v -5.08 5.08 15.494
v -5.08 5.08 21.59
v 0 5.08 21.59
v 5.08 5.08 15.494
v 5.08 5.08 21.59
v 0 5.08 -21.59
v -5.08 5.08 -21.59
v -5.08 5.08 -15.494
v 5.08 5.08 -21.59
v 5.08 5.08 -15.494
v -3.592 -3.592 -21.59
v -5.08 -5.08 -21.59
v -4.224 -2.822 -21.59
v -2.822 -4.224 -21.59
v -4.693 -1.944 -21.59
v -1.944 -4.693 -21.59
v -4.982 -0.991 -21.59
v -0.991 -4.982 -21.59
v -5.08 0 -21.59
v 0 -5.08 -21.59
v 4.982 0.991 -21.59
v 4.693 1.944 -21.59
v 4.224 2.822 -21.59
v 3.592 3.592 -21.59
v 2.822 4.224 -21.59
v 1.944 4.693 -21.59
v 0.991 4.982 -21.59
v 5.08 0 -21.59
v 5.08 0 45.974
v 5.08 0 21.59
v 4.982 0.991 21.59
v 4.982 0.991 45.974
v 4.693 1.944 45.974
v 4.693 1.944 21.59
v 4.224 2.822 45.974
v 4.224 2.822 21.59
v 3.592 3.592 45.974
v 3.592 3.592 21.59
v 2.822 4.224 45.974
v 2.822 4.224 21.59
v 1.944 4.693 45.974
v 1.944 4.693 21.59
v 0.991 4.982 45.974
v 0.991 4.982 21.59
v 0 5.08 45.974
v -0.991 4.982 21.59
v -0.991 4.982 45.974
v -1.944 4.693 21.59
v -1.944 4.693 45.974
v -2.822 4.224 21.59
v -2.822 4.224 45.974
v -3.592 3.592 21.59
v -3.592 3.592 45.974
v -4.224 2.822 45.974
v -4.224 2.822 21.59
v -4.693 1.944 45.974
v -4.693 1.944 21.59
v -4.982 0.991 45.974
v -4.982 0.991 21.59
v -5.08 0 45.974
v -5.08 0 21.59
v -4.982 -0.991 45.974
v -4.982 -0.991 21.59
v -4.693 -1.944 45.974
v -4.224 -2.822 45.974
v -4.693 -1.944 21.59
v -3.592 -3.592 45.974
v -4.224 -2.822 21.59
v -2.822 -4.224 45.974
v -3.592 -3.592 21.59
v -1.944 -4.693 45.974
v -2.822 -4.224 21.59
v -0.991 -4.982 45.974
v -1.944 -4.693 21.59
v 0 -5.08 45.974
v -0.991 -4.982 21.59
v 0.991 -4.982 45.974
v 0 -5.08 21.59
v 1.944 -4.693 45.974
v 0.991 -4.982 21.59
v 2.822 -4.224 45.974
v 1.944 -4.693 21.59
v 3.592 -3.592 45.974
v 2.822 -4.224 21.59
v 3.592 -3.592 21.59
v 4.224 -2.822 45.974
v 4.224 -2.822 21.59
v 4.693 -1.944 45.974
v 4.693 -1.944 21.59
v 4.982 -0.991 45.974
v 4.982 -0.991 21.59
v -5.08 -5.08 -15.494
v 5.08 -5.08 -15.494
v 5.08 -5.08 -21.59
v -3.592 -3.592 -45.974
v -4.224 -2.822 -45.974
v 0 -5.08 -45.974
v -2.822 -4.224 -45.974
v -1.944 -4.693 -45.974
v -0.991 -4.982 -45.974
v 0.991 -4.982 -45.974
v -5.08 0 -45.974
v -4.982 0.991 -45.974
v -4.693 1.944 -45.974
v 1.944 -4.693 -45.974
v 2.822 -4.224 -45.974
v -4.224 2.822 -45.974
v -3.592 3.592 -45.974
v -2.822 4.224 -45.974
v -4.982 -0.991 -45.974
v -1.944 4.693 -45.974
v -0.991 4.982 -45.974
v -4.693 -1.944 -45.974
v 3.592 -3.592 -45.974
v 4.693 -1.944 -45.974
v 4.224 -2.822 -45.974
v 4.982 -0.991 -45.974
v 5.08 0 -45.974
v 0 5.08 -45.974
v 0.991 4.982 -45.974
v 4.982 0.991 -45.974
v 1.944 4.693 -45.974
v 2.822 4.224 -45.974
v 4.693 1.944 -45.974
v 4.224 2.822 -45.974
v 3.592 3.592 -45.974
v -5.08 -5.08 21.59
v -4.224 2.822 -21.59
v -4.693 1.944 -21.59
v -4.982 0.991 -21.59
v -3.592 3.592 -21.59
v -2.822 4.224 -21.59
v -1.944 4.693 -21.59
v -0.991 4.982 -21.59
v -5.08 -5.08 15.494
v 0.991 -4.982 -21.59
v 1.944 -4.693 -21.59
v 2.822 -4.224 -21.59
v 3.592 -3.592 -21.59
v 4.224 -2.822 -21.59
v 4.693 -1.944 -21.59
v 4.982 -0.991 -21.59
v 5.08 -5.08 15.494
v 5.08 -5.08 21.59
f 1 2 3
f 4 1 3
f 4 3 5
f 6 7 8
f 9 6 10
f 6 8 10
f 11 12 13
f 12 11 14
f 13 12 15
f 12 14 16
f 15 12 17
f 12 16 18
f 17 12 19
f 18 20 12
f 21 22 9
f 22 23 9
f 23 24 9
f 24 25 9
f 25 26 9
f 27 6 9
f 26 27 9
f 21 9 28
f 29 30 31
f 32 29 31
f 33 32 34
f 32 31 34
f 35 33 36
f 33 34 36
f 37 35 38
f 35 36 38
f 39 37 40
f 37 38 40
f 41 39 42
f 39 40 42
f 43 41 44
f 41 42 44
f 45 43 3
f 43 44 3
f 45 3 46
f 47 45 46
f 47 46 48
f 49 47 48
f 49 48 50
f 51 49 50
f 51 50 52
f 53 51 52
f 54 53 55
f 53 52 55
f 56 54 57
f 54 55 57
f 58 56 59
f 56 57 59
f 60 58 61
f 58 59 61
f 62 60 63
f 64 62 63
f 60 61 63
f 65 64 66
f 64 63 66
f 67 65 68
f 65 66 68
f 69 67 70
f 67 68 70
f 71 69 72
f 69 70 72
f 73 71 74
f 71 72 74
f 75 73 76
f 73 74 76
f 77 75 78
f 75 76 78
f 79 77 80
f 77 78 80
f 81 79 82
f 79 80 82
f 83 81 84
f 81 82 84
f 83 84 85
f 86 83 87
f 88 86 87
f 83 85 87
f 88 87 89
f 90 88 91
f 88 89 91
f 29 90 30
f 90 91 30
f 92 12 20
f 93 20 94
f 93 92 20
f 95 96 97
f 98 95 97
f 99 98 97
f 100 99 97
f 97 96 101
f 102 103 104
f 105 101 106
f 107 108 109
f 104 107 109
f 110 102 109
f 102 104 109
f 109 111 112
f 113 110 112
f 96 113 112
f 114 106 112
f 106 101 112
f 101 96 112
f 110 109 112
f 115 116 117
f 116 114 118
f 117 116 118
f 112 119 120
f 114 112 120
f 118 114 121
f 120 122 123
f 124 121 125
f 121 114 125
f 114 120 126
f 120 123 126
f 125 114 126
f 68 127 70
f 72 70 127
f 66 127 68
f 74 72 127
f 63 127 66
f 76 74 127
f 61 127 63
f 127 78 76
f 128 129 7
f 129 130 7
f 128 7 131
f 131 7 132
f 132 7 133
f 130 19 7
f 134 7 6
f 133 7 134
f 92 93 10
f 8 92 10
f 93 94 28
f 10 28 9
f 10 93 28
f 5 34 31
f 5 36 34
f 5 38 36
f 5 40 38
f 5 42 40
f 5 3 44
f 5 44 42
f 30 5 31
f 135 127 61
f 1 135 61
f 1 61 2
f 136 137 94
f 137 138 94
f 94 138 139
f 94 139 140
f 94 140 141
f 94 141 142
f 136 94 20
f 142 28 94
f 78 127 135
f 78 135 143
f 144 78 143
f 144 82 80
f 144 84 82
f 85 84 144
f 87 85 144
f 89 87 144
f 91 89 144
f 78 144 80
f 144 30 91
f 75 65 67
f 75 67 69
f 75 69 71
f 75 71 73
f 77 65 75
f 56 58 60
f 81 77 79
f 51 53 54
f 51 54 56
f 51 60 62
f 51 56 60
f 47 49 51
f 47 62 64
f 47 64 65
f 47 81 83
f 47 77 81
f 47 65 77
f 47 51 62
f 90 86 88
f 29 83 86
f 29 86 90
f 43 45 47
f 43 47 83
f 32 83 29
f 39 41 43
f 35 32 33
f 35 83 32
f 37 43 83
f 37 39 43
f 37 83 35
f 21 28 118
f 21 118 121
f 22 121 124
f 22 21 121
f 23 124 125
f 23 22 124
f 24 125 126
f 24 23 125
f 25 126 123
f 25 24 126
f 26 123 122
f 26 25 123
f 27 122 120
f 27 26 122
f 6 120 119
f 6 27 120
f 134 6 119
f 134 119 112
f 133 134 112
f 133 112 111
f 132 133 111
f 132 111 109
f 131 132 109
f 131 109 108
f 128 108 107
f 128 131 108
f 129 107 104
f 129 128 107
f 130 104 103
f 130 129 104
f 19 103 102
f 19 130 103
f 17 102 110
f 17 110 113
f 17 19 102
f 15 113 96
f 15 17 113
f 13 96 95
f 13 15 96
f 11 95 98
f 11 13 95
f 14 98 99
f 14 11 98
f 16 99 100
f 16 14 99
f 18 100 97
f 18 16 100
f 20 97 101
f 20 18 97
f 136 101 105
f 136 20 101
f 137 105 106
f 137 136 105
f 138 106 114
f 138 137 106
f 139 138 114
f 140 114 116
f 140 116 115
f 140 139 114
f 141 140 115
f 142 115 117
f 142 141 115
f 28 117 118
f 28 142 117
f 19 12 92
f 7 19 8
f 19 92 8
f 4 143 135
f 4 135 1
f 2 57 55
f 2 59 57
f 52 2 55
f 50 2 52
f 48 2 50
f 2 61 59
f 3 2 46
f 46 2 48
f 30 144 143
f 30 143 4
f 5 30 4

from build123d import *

# Parameters (mm, degrees)
SKETCH1_W           = 10.16
SKETCH1_H           = 10.16
BOSS_EXTRUDE2_DEPTH = 21.59
SKETCH2_R           = 5.08
BOSS_EXTRUDE3_DEPTH = 24.384
SKETCH4_W           = 30.988
SKETCH4_H           = 10.16
CUT_EXTRUDE2_DEPTH  = 48.35652728


with BuildPart() as part:
    # Sketch1 → Boss-Extrude2 (new, symmetric)
    with BuildSketch(Plane.XY):
        Rectangle(SKETCH1_W, SKETCH1_H)
    extrude(amount=BOSS_EXTRUDE2_DEPTH, both=True)

    # Sketch2 → Boss-Extrude3 (add)
    with BuildSketch(Plane.XY.offset(21.59)):
        Circle(SKETCH2_R)
    boss_extrude3 = extrude(amount=BOSS_EXTRUDE3_DEPTH)

    # Mirror1: Boss-Extrude3 across plane
    add(boss_extrude3.mirror(Plane.XY))

    # Sketch4 → Cut-Extrude2 (cut, through all)
    with BuildSketch(Plane(origin=(5.08, 0, 0), x_dir=(0, 0, -1), z_dir=(1, 0, 0))):
        Rectangle(SKETCH4_W, SKETCH4_H)
    extrude(amount=-CUT_EXTRUDE2_DEPTH, mode=Mode.SUBTRACT)


with BuildPart() as cut_extrude2_piece_1:
    # of the separate pieces the step leaves, piece 1, a body of its own (cut_extrude2_pieces)
    add(part.part.solids().sort_by_distance((-5.08, 5.08, 15.494))[0])


with BuildPart() as cut_extrude2_piece_2:
    # of the separate pieces the step leaves, piece 2, a body of its own (cut_extrude2_pieces)
    add(part.part.solids().sort_by_distance((-5.08, 5.08, -21.59))[0])


solid = Compound([cut_extrude2_piece_1.part, cut_extrude2_piece_2.part])
